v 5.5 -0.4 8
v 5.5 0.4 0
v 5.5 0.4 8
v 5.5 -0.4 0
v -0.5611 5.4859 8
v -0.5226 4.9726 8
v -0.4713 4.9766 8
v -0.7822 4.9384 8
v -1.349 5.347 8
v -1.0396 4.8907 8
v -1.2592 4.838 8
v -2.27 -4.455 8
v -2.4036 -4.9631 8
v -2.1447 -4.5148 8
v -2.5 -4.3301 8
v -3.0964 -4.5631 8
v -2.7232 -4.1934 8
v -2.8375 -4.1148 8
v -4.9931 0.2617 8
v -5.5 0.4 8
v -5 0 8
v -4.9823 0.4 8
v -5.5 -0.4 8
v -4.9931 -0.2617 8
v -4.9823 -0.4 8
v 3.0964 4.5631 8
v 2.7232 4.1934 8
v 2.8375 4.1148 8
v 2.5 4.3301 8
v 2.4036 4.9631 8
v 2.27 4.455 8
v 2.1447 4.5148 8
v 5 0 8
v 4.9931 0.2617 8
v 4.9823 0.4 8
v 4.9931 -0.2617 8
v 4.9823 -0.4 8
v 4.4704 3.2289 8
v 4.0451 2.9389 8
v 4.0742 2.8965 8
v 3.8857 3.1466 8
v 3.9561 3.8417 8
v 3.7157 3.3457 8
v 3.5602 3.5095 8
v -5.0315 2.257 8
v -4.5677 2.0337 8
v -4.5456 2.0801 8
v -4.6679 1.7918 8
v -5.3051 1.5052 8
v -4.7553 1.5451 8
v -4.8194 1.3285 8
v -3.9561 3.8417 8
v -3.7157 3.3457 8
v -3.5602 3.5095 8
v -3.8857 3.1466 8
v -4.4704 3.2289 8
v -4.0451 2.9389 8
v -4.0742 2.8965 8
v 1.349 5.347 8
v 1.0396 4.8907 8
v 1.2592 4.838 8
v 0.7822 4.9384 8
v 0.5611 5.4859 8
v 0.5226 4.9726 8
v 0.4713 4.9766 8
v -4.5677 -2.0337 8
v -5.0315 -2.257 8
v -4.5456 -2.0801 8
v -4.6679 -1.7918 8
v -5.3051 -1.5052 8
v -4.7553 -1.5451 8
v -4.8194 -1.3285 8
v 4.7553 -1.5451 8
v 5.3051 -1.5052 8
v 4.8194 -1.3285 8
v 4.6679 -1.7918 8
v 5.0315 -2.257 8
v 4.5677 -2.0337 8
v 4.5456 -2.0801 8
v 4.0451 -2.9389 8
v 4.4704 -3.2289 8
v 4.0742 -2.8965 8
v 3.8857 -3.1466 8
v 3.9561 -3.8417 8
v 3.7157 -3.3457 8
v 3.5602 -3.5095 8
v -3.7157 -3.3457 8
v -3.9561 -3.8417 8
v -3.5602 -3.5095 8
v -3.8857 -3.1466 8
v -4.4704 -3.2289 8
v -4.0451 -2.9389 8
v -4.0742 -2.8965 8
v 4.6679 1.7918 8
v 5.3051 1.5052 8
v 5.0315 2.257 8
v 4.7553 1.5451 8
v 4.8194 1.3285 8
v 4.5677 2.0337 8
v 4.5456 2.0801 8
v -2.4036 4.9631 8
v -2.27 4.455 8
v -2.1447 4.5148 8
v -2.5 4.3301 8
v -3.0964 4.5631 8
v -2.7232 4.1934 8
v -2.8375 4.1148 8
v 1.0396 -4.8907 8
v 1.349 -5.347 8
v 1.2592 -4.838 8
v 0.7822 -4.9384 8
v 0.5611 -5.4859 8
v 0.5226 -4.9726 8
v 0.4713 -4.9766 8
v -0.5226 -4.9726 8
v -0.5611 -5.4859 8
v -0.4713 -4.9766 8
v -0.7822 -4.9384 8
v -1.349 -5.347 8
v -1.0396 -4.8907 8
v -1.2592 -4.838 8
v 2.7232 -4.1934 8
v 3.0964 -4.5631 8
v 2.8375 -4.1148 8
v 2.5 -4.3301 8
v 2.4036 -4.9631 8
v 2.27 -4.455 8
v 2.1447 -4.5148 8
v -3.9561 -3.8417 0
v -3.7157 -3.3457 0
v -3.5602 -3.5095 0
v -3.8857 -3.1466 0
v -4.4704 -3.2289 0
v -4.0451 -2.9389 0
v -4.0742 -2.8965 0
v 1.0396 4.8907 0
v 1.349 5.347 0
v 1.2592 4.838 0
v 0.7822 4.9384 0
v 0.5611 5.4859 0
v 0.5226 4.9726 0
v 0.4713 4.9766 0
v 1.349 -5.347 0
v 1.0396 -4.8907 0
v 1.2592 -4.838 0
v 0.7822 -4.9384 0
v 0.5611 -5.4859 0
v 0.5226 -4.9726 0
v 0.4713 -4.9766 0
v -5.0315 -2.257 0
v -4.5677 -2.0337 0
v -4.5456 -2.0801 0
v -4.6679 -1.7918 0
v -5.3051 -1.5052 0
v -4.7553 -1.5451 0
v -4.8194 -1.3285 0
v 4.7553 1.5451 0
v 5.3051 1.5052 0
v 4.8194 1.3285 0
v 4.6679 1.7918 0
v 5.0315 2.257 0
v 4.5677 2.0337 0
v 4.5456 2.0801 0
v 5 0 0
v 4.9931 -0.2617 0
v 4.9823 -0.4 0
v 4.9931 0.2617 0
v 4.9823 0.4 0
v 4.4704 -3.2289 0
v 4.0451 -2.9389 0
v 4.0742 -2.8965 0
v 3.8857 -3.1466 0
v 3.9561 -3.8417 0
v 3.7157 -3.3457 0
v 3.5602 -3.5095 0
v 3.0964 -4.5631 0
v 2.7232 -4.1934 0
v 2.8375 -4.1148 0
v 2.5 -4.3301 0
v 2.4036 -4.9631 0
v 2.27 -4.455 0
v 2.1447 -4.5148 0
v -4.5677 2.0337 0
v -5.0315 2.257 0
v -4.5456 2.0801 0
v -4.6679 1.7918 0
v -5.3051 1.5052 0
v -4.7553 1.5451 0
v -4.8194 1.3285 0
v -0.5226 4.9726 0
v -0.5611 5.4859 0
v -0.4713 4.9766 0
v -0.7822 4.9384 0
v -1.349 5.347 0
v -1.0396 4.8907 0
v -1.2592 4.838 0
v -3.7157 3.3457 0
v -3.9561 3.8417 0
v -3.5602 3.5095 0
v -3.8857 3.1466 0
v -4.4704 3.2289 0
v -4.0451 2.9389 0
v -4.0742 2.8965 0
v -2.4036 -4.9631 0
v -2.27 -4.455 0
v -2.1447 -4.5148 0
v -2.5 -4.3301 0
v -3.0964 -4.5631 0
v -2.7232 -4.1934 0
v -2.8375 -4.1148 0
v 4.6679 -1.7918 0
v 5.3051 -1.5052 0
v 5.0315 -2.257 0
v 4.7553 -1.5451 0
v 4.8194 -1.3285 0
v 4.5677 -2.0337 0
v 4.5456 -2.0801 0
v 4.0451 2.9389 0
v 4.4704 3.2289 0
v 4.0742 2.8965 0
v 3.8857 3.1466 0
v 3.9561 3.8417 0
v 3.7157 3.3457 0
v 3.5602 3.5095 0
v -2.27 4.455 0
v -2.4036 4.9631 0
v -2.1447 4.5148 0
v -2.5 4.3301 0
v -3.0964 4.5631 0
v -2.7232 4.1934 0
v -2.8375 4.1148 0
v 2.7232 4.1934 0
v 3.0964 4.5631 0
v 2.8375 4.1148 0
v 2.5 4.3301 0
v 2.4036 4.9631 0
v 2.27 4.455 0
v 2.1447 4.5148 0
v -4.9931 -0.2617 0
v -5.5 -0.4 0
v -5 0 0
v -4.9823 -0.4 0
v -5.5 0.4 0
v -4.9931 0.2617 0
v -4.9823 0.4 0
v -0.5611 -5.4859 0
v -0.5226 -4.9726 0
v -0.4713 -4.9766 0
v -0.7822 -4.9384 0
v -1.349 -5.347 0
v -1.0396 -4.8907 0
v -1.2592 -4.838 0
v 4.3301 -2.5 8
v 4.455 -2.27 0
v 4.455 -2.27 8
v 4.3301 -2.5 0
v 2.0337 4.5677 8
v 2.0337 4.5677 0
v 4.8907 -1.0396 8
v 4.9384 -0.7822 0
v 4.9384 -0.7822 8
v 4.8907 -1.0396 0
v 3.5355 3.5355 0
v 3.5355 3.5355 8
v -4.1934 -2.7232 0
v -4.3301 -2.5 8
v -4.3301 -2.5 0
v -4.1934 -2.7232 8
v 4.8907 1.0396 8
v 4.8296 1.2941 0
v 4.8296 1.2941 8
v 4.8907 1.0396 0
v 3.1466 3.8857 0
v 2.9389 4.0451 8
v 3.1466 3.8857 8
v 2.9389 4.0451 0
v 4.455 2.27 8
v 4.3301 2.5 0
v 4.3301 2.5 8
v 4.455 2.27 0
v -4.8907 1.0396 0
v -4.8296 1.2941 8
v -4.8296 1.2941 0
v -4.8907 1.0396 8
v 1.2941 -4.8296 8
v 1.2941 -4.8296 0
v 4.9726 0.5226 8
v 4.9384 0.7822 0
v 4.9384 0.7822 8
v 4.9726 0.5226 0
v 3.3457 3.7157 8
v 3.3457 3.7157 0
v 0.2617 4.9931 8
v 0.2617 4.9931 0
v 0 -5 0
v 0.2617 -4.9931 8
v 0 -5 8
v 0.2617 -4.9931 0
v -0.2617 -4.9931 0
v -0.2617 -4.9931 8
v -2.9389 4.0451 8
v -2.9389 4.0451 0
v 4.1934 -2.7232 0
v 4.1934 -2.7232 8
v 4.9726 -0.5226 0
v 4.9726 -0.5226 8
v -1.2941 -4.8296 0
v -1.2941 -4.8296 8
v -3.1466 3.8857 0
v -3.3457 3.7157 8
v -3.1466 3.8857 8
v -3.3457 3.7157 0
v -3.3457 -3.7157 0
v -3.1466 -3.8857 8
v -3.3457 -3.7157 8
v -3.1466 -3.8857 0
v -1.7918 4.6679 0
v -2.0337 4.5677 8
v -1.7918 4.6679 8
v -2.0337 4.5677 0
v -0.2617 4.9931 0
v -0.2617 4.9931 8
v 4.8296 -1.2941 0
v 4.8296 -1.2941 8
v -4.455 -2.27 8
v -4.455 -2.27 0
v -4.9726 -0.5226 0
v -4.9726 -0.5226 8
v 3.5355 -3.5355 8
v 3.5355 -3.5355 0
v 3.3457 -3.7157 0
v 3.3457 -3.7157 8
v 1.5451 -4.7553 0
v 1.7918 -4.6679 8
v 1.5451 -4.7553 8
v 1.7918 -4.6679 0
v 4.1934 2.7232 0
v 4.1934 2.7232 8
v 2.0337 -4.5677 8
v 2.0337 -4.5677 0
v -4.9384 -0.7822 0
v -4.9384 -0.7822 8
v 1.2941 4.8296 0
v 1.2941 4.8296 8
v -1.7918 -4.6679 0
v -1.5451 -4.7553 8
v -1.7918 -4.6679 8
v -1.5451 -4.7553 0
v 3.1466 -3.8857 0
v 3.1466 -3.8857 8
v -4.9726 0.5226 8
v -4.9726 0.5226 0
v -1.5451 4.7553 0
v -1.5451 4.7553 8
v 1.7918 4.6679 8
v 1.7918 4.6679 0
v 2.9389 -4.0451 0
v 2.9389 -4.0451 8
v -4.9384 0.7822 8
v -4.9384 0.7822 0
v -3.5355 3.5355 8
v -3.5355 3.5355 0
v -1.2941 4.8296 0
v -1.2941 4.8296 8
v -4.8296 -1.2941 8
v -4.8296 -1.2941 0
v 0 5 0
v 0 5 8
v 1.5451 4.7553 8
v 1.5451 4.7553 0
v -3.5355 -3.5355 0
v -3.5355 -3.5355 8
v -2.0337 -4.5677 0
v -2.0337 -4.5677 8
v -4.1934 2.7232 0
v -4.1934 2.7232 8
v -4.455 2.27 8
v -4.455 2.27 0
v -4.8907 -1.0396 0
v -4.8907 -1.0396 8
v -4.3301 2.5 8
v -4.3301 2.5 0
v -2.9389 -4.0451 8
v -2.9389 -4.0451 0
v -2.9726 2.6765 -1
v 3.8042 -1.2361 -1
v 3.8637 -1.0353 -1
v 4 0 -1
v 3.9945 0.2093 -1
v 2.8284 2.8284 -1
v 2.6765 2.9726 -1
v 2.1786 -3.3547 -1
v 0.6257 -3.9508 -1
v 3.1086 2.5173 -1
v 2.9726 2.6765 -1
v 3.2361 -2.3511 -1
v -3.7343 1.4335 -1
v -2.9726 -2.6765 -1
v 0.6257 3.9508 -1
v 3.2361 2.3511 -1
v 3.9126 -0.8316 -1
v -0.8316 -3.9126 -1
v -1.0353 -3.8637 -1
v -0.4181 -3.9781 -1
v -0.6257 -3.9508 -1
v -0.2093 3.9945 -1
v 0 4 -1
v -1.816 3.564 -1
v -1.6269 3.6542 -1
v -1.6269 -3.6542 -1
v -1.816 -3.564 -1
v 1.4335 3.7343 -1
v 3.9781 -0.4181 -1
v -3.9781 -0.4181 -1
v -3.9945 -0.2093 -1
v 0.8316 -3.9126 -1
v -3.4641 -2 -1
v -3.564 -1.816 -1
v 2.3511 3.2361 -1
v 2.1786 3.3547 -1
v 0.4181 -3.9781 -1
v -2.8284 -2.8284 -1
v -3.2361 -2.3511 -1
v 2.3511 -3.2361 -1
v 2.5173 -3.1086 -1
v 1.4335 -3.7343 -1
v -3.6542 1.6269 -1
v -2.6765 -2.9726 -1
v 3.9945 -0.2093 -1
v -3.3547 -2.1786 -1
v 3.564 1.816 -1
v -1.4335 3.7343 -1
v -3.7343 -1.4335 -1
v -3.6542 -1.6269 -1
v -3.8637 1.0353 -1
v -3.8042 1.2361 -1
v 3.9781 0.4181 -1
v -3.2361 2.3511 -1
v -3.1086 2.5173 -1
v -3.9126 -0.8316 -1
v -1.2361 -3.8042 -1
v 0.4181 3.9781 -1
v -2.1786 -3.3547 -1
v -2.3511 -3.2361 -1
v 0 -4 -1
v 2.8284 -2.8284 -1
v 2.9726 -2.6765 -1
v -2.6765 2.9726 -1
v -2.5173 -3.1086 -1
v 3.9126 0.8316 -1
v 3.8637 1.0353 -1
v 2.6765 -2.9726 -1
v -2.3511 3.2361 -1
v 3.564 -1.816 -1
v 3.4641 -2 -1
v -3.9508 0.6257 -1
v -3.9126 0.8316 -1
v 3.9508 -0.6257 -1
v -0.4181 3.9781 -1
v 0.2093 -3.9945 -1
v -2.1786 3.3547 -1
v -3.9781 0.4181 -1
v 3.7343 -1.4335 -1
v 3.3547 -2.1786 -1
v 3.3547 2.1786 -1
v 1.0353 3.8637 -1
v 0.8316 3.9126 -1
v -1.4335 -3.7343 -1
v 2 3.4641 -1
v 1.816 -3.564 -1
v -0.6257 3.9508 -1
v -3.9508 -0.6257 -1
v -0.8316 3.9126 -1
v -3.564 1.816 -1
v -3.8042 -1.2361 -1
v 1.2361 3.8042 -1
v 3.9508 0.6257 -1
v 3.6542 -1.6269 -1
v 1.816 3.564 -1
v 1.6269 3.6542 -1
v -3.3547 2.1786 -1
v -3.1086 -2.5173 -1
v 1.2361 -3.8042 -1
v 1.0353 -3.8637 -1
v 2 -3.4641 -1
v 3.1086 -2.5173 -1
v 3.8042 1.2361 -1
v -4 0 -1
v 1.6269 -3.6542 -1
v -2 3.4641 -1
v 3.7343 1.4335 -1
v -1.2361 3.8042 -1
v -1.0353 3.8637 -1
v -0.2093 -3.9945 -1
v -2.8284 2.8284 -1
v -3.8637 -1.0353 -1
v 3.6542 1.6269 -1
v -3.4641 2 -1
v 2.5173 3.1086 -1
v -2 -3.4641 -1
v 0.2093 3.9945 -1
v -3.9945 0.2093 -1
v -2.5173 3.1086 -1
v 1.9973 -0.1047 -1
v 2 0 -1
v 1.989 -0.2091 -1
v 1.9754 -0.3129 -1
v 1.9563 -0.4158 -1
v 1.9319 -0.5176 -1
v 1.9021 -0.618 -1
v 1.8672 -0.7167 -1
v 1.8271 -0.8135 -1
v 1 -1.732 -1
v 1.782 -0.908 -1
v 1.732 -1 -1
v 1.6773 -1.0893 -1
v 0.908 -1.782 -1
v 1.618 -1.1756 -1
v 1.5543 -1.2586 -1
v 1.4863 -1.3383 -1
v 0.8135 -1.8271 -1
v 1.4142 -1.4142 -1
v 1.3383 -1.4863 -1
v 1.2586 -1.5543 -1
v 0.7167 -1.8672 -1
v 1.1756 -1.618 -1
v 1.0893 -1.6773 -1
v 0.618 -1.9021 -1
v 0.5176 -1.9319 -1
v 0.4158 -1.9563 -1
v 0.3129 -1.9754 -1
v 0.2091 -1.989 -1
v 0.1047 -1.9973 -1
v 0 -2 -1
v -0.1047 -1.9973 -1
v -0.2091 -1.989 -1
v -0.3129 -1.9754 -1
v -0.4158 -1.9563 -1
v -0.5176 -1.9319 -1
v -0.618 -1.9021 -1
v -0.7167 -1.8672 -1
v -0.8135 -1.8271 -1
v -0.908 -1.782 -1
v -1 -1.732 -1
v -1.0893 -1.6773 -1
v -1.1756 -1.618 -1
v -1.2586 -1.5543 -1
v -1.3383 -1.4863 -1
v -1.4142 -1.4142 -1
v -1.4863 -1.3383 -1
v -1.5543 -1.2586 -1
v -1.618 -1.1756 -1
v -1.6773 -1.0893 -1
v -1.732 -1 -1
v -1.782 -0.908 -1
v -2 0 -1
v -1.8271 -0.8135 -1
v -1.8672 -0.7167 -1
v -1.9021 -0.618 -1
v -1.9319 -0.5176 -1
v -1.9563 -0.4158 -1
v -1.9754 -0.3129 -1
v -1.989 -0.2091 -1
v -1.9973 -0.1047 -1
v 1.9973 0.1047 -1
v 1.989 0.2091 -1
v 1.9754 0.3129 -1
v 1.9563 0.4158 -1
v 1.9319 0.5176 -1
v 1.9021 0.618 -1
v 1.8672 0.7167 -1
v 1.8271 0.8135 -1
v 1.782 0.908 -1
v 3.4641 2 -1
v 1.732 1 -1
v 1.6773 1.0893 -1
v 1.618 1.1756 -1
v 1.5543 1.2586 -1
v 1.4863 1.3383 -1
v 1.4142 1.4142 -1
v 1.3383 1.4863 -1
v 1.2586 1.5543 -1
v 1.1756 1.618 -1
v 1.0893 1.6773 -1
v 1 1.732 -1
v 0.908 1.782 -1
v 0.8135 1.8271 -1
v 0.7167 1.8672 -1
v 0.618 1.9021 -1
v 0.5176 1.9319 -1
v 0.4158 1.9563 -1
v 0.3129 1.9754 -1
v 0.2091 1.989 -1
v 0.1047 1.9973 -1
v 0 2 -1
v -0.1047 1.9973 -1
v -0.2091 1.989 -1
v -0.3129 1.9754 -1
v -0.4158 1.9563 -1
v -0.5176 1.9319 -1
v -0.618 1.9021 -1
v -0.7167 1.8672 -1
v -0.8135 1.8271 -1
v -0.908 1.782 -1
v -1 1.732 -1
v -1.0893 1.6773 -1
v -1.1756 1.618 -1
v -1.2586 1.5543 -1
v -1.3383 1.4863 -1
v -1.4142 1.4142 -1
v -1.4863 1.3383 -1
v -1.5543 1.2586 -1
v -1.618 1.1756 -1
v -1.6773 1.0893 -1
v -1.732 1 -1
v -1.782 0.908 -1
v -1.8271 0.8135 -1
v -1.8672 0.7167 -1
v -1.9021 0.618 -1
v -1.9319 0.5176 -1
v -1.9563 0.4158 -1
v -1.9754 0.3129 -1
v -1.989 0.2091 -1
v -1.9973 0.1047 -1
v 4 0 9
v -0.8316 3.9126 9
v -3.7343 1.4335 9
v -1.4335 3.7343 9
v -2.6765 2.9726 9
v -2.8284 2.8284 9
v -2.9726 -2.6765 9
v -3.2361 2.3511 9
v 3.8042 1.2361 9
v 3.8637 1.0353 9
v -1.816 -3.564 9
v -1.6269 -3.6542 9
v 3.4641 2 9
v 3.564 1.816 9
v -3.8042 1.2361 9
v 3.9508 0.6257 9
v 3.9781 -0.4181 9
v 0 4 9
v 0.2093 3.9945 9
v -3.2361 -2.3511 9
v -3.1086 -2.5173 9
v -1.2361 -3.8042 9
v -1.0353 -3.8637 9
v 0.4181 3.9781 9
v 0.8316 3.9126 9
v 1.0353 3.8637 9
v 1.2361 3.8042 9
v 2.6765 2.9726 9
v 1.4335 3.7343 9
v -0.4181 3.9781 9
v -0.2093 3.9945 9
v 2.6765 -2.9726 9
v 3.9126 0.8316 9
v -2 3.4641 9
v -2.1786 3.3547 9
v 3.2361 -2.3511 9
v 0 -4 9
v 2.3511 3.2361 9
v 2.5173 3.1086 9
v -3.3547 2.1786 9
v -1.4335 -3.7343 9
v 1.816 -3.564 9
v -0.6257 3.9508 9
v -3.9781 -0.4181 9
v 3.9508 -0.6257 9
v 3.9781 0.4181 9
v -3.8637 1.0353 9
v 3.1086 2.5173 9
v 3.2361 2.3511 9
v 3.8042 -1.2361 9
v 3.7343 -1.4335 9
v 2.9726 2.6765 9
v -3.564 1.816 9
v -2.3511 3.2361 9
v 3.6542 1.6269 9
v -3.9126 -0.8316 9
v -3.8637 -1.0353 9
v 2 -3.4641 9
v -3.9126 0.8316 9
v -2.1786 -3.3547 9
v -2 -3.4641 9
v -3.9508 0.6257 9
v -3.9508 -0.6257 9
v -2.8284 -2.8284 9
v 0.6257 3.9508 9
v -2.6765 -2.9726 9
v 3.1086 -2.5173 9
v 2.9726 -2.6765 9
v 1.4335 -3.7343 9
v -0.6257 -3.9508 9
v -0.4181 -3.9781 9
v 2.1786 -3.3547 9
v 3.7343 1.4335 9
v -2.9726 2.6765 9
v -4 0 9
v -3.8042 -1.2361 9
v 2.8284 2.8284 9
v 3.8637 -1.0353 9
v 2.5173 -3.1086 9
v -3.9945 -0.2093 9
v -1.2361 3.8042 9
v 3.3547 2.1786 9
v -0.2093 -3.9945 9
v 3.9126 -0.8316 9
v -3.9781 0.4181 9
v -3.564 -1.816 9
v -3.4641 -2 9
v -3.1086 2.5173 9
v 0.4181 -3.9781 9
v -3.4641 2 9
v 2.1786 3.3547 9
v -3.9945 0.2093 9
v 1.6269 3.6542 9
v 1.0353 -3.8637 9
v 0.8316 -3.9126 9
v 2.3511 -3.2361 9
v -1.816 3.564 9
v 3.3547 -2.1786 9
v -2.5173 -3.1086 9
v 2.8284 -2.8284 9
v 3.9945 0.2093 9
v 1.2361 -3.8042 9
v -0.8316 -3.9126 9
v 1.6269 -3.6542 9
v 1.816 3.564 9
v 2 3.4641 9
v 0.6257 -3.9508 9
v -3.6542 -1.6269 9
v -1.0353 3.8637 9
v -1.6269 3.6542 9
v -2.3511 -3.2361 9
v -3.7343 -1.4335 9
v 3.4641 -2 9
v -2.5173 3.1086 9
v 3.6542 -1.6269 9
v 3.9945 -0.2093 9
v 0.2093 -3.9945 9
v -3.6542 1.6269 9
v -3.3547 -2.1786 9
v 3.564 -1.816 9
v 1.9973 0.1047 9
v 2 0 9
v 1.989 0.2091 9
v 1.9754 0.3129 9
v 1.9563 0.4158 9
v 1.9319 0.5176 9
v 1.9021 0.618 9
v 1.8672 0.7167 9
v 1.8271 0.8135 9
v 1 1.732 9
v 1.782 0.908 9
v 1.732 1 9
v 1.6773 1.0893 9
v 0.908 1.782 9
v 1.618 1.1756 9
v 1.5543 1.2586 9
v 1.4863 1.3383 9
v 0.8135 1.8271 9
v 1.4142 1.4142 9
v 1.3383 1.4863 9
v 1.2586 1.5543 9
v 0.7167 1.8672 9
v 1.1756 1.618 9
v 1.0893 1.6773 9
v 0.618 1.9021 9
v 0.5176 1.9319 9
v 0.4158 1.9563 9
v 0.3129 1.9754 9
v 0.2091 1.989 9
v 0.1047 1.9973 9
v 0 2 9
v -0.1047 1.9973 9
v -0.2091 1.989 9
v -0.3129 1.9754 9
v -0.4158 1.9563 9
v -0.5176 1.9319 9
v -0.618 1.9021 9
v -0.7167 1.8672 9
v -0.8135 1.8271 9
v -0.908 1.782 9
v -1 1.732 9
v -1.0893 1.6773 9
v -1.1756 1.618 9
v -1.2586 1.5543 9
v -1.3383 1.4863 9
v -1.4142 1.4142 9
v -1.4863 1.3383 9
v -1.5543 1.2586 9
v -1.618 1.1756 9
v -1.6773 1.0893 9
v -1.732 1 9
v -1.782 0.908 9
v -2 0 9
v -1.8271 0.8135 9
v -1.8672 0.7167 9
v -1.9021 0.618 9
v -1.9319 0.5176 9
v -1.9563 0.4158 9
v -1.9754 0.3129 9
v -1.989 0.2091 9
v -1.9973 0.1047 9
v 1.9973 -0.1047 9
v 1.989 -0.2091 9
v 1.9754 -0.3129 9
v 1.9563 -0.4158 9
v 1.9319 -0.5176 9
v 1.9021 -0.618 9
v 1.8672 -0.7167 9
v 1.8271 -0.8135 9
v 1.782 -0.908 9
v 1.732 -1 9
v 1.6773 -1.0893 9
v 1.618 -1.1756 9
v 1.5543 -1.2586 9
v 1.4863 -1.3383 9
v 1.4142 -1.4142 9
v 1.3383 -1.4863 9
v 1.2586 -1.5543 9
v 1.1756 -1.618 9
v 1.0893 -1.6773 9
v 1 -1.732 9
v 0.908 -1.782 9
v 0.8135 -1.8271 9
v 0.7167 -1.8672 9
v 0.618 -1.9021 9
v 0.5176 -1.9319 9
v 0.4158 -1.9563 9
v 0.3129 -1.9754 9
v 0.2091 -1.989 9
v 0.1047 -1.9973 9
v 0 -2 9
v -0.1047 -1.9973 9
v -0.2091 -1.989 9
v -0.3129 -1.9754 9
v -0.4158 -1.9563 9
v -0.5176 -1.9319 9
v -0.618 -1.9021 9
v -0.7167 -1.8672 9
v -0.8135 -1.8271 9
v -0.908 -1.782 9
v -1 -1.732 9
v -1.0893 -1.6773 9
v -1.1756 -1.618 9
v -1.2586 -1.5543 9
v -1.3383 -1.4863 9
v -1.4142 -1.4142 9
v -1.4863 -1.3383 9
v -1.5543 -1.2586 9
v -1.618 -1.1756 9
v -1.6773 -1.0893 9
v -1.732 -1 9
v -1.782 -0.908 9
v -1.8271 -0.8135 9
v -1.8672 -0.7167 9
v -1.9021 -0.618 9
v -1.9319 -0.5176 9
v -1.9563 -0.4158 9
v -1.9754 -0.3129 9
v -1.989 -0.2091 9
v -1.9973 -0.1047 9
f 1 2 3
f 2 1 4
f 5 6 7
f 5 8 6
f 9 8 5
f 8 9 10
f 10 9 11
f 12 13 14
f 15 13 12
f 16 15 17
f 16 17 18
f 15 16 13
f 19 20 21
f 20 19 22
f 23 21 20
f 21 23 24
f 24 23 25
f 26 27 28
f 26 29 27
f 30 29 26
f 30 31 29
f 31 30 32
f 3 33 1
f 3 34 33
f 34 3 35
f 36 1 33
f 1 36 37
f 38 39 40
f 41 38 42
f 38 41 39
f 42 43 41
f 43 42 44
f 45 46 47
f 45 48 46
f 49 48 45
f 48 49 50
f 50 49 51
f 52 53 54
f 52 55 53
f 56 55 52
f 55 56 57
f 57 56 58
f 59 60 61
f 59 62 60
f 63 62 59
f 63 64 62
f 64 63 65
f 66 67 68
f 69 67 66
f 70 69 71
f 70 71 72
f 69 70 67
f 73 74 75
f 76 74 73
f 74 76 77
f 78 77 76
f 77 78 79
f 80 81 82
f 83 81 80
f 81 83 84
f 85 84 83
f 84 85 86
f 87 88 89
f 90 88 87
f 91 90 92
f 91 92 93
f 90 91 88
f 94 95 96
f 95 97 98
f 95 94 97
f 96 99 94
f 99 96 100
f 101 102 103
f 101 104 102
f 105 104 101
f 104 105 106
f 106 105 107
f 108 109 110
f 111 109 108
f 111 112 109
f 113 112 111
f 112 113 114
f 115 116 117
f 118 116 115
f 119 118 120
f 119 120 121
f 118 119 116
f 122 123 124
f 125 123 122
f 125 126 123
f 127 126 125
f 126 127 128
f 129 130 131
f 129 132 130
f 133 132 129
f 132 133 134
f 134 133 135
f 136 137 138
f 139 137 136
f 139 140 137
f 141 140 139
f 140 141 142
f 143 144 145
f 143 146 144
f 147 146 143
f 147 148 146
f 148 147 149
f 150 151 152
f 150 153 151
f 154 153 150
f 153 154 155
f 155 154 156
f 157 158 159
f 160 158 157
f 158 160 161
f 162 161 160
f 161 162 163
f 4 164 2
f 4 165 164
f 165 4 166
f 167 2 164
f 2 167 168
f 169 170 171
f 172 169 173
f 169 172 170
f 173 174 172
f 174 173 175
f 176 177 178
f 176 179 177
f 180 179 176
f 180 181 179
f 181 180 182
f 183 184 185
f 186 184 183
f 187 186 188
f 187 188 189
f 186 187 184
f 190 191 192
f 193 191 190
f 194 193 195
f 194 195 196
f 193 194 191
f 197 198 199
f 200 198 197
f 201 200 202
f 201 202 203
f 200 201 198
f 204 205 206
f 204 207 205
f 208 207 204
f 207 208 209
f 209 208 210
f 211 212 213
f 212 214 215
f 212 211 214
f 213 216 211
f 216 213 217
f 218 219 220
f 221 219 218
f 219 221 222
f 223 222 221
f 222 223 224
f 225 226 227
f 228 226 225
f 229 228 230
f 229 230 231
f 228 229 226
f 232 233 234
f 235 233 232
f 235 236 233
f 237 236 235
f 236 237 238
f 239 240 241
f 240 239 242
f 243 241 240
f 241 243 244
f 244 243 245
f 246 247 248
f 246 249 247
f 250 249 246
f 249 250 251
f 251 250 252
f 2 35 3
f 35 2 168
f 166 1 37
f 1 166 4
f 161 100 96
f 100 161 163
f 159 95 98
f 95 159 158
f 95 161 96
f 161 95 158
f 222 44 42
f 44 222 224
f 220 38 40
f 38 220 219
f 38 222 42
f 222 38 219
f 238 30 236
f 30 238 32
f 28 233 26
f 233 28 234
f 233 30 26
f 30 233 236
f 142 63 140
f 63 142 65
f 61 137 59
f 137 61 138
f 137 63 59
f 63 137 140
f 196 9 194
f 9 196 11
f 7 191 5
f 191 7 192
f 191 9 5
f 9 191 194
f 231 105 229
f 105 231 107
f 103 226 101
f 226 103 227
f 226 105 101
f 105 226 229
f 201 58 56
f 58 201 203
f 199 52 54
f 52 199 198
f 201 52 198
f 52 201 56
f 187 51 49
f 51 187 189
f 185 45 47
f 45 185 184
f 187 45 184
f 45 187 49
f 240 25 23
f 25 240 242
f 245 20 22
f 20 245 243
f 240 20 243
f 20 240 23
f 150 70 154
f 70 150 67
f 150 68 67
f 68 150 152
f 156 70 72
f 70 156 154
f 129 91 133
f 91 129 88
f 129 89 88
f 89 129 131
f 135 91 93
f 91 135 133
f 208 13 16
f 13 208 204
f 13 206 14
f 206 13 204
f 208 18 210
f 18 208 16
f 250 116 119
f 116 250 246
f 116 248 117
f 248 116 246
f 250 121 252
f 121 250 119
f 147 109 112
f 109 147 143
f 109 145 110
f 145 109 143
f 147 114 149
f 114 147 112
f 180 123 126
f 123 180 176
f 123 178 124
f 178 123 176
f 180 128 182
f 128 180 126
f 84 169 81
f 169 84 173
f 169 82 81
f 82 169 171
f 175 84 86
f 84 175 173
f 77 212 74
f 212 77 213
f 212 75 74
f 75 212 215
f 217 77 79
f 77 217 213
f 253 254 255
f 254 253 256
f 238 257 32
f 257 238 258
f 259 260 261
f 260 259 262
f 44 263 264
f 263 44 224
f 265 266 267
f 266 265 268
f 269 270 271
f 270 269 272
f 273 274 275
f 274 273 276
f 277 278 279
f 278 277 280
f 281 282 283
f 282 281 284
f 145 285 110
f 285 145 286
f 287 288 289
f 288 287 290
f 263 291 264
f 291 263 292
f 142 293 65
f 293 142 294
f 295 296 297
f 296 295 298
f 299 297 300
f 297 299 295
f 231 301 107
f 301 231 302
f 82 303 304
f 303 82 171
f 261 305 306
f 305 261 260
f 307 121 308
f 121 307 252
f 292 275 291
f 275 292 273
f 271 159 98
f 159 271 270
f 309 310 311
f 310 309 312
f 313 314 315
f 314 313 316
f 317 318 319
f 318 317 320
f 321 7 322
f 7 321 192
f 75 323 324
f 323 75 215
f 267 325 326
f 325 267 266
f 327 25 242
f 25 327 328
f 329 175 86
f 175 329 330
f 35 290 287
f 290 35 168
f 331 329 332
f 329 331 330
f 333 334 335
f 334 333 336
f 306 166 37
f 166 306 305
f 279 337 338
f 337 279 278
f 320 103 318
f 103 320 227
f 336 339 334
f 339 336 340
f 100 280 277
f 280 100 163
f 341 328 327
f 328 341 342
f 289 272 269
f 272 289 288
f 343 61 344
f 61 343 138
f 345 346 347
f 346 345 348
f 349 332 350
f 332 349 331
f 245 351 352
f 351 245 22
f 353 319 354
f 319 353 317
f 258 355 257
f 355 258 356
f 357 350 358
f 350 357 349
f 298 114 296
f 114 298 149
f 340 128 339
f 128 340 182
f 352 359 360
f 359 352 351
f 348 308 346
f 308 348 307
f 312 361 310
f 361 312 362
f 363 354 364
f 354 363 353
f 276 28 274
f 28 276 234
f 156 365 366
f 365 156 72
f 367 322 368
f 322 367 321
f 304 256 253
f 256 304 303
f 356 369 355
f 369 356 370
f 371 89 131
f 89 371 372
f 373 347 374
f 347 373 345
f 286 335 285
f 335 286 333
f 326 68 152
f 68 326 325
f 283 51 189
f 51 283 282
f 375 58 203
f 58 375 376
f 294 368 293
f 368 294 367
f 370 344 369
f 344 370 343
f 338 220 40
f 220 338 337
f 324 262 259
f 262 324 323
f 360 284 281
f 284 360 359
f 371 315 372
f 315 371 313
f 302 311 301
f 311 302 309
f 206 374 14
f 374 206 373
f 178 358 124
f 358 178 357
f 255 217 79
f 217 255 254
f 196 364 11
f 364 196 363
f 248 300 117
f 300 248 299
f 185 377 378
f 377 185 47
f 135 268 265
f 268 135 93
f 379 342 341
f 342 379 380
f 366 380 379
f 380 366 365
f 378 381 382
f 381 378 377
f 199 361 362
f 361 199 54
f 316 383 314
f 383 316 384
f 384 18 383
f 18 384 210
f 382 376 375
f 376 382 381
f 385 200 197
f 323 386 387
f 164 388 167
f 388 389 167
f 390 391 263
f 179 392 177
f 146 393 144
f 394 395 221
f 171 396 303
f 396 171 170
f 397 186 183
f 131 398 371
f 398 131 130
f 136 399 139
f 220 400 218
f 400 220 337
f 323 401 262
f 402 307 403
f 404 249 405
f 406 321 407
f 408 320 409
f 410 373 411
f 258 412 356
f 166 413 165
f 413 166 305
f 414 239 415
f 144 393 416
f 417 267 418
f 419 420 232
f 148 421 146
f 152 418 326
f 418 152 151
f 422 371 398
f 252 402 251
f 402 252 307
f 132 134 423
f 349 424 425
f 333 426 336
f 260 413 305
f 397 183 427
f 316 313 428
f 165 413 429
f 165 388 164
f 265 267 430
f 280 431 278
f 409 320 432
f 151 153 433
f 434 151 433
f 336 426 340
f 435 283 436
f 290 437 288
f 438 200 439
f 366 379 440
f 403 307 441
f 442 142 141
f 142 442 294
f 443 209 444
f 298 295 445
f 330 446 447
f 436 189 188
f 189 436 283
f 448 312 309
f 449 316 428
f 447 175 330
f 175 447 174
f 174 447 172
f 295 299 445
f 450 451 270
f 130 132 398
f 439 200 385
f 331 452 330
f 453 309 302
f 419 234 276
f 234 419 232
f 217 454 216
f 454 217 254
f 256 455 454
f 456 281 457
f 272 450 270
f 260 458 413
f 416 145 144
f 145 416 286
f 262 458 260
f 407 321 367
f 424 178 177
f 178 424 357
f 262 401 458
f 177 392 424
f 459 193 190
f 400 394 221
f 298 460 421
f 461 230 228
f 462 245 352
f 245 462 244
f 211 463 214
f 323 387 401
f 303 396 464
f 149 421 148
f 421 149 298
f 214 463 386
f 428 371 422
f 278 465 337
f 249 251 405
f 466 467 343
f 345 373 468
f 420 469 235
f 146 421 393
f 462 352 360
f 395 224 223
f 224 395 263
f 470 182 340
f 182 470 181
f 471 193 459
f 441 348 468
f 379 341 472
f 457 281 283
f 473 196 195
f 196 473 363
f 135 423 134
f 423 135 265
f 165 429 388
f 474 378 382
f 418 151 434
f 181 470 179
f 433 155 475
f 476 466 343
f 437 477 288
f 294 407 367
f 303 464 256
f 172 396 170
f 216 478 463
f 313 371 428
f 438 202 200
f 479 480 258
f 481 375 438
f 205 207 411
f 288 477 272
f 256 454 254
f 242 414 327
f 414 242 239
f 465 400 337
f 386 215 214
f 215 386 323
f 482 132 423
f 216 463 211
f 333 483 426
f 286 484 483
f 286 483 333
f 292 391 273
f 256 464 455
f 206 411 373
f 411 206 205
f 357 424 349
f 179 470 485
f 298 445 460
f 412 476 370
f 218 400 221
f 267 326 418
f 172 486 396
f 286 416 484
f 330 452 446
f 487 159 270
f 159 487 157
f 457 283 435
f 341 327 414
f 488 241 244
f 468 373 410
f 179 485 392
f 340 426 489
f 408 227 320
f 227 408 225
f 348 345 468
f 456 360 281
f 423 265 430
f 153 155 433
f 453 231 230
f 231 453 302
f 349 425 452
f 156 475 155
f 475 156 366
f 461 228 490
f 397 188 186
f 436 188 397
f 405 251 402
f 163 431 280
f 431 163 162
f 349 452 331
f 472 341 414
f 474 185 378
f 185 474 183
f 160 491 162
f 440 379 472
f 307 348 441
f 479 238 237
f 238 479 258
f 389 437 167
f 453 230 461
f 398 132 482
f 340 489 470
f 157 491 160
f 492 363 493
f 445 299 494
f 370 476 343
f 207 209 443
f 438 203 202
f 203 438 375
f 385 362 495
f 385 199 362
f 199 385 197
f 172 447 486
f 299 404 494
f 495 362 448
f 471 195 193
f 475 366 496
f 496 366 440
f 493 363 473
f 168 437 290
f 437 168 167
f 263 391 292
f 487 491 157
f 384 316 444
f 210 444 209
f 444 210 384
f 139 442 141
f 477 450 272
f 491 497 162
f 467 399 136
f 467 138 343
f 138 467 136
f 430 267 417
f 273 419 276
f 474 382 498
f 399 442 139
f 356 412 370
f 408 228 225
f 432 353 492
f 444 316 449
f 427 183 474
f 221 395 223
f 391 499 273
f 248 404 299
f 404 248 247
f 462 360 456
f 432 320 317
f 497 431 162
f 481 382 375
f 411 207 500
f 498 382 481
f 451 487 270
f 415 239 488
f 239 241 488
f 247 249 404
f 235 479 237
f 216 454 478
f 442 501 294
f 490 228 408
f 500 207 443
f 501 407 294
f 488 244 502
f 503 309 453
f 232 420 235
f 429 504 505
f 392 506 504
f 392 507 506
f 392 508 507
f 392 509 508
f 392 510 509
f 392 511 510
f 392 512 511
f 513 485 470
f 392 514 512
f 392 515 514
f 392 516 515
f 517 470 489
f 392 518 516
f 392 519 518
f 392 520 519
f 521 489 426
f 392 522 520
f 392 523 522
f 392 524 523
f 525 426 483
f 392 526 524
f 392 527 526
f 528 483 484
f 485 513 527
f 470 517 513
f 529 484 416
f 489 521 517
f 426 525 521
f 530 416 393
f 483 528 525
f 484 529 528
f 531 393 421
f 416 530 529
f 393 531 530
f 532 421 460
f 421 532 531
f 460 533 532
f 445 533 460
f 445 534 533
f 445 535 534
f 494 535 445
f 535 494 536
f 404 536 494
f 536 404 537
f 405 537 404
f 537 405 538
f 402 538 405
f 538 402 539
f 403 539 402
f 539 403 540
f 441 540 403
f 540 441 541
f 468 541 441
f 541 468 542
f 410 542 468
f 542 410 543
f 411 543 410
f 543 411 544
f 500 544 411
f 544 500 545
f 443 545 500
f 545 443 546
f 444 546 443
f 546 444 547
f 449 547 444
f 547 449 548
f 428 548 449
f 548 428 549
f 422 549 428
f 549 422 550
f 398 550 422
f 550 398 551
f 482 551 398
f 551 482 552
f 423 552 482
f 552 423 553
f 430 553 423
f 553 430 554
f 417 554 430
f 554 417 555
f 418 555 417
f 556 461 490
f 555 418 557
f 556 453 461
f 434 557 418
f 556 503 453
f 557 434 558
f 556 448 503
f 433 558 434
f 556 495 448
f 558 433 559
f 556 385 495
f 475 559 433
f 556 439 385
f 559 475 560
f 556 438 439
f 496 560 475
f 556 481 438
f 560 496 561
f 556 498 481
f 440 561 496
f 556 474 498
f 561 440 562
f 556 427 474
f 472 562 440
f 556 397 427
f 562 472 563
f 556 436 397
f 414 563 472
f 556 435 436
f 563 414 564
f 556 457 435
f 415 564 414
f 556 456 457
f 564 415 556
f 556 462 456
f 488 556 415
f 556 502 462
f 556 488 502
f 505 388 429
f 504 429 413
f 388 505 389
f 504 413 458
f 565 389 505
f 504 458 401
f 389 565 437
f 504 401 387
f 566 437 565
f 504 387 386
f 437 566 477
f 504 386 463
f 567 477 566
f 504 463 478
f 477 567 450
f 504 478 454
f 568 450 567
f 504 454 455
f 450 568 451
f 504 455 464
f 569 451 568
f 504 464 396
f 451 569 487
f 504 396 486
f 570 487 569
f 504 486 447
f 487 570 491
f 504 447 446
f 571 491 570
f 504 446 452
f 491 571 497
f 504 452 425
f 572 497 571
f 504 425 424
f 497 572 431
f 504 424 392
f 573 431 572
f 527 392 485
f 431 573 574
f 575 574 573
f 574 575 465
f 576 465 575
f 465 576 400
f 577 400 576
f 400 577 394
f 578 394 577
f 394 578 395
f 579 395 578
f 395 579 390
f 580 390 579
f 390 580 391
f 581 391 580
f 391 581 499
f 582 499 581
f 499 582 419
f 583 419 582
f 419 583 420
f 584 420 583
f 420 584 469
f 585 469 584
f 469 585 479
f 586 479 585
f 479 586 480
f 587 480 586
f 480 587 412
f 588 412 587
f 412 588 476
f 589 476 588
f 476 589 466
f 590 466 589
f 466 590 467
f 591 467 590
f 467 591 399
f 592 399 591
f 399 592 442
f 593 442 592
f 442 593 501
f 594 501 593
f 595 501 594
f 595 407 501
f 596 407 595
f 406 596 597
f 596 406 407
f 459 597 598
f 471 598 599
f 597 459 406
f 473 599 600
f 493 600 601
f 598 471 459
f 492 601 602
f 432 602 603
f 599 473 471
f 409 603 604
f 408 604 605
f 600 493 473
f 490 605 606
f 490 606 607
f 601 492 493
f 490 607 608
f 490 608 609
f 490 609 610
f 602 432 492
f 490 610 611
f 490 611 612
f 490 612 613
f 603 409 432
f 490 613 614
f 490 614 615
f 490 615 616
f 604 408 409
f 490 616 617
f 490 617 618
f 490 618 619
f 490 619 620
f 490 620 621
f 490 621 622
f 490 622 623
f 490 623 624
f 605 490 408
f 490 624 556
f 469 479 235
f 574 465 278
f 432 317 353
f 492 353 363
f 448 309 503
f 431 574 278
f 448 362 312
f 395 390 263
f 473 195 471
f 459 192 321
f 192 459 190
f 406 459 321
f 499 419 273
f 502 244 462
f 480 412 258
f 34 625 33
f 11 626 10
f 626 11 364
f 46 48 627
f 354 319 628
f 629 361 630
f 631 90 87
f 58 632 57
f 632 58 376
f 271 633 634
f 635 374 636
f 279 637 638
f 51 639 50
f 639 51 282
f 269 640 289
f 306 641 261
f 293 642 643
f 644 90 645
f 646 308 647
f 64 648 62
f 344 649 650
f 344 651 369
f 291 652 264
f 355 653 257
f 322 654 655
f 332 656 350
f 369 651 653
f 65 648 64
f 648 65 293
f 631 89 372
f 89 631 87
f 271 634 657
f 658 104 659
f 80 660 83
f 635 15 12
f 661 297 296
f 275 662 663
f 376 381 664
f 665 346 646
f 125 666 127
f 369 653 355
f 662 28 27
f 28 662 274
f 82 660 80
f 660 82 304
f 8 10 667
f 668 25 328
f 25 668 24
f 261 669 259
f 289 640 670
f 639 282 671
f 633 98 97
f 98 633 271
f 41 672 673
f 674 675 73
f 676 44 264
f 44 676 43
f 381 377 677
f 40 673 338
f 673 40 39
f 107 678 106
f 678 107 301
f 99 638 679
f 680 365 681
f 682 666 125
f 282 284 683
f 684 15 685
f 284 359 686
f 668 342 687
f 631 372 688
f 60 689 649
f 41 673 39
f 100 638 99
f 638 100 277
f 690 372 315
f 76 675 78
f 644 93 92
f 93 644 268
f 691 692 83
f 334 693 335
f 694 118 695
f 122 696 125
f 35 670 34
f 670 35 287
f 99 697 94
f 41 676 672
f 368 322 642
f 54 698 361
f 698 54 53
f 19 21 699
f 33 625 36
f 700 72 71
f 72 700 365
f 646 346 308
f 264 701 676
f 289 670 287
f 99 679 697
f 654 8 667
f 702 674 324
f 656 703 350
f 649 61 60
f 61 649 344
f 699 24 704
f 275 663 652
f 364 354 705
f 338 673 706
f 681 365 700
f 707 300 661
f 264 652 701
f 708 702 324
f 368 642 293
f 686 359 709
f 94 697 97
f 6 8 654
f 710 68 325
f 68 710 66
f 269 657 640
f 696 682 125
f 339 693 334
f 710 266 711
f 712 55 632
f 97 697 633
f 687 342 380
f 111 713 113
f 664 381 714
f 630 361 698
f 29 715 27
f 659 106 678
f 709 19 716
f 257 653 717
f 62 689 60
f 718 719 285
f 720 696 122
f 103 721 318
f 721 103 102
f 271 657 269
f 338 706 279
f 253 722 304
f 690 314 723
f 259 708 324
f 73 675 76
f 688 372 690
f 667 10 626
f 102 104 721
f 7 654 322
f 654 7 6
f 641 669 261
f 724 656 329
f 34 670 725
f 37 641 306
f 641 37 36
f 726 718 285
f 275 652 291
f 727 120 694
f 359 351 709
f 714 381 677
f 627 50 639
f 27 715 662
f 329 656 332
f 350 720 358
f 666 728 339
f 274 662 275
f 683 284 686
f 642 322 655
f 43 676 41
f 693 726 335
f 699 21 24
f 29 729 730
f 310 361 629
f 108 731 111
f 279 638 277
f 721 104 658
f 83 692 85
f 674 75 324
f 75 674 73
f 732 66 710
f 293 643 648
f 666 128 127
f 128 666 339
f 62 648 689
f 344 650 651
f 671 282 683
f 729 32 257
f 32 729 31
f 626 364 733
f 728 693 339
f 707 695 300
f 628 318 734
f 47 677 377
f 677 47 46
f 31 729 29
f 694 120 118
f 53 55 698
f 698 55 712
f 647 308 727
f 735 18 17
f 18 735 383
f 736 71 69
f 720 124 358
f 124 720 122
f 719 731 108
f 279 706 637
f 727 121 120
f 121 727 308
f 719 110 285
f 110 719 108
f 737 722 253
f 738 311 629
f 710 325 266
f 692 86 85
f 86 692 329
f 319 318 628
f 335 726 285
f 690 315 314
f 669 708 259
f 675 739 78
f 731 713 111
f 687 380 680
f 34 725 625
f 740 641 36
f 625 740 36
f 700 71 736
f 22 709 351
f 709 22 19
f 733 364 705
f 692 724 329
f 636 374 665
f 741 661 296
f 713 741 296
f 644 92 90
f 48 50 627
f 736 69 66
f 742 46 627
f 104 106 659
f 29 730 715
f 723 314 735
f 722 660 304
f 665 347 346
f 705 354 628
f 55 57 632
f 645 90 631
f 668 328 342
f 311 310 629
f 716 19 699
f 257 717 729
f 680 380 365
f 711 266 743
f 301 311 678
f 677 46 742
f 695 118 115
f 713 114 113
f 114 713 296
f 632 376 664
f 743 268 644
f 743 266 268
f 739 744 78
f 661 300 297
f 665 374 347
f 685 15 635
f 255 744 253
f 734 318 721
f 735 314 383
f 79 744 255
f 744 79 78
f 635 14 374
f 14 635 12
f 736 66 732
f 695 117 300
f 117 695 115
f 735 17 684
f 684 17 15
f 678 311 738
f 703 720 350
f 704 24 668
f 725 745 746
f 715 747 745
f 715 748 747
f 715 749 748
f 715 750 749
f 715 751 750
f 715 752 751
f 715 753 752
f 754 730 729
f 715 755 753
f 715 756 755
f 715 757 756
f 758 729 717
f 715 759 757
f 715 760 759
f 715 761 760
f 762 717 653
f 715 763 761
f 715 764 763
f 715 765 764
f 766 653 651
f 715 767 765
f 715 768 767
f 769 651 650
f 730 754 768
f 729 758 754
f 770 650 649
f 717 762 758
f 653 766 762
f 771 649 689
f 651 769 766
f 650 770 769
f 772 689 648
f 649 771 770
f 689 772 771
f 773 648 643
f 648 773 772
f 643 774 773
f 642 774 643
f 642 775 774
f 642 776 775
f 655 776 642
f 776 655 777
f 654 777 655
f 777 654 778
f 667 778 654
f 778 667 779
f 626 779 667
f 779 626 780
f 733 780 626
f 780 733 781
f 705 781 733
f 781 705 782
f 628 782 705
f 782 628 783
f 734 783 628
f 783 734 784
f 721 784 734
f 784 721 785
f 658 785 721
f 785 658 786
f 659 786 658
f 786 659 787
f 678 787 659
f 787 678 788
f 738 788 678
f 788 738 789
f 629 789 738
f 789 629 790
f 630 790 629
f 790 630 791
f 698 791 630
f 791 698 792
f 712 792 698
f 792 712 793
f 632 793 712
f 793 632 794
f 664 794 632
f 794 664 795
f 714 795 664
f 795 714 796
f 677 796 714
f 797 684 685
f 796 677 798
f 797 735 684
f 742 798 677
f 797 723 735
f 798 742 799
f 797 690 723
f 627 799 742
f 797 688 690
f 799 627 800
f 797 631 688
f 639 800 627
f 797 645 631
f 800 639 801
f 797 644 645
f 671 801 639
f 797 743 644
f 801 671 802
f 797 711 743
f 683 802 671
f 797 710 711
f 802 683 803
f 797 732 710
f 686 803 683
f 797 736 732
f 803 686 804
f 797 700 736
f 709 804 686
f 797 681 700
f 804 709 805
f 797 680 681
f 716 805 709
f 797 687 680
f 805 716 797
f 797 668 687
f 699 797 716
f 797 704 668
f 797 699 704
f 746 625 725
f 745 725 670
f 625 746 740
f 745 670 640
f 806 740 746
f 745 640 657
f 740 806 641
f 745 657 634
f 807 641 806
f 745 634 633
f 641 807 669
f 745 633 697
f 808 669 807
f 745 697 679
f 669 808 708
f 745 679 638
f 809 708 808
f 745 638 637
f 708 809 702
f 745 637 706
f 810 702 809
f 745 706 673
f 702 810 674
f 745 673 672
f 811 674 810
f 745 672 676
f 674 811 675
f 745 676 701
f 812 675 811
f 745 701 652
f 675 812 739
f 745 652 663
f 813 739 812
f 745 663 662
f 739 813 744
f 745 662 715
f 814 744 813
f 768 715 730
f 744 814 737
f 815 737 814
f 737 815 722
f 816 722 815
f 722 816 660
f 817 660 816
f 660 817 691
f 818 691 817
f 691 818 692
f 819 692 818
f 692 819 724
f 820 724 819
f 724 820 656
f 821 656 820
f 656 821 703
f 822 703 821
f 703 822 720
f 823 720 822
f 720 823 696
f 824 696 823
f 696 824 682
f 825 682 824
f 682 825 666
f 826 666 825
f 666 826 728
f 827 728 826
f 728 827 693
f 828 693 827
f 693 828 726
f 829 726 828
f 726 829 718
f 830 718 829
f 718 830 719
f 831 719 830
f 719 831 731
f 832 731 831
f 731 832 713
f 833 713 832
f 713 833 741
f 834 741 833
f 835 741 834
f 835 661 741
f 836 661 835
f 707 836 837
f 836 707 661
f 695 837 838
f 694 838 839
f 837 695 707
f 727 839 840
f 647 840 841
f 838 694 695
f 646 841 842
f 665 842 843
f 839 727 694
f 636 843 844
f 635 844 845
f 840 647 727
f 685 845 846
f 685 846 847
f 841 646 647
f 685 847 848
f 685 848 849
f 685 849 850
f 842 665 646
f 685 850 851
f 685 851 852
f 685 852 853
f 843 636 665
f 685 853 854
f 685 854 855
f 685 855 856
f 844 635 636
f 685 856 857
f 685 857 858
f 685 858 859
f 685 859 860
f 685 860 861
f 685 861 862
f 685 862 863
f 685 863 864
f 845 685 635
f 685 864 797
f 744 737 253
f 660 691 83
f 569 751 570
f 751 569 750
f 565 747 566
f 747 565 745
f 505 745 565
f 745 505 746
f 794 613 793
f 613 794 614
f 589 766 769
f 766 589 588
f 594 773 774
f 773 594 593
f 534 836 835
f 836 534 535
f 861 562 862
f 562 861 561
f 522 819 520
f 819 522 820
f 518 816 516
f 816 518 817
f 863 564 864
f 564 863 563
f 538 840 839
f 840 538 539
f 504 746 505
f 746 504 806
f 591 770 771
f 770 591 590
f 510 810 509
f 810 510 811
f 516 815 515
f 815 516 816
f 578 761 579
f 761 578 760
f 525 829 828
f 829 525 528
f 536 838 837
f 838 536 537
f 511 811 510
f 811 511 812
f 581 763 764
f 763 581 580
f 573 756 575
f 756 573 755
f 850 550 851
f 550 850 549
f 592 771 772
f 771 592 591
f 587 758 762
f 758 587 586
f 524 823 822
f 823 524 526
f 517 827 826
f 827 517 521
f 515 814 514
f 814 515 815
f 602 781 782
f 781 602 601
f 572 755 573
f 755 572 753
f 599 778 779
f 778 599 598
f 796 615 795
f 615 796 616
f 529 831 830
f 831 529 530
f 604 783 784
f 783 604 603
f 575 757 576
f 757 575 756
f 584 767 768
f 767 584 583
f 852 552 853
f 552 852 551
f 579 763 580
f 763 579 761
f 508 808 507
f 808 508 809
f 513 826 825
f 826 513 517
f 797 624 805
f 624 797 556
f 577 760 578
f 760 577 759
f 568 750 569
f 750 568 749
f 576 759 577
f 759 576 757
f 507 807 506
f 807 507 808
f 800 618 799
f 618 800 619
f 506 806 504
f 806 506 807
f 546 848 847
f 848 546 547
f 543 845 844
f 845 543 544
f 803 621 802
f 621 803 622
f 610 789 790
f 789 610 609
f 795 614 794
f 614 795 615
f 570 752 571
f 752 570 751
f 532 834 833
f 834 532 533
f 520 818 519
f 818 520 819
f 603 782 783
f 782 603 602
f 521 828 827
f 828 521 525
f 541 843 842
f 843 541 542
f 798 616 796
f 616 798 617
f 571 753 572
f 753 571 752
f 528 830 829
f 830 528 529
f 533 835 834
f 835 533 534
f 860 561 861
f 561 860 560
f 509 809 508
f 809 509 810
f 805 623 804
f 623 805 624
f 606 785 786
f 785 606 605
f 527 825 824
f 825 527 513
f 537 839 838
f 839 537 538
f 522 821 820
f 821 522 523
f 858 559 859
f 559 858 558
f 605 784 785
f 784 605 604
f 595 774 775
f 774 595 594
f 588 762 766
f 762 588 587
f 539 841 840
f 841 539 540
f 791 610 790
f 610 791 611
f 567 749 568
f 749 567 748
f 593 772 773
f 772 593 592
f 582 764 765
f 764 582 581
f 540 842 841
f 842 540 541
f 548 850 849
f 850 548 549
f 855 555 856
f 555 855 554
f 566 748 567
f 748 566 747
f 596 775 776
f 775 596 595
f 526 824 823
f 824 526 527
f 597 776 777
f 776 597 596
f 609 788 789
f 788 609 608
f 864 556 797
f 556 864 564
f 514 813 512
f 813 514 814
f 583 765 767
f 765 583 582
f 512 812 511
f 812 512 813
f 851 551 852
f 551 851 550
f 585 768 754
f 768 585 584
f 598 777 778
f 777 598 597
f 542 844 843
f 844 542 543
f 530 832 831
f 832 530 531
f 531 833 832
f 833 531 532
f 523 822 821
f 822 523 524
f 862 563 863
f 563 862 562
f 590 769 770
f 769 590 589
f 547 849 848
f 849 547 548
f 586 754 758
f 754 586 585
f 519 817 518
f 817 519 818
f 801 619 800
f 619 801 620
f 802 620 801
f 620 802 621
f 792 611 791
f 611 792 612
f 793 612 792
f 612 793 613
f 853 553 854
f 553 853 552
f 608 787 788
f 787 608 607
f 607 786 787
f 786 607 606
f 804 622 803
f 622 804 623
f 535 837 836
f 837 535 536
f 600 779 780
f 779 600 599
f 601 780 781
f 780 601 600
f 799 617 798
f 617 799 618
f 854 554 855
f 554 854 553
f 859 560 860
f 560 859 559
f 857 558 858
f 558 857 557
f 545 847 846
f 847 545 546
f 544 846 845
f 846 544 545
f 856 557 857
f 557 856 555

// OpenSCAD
$fn = 120;

// Threaded heat-set insert (mm)
outer_diameter = 10.0;
length         = 8.0;

// For 4.0mm screws (user requested)
inner_diameter = 4.0;

// Knurl / ribs
knurl_depth   = 0.5;   // radial protrusion beyond OD
knurl_count   = 18;    // number of ribs around circumference
knurl_width   = 0.8;   // tangential width of each rib
knurl_overlap = 0.20;  // how much each rib sinks into the body for guaranteed connectivity

// End chamfers
lead_in_chamfer          = 1.0;  // bottom
installation_end_chamfer = 1.0;  // top

eps = 0.02;

module threaded_insert() {
    difference() {
        heat_set_insert_body();
        internal_bore();
    }
}

module heat_set_insert_body() {
    union() {
        // Main body
        cylinder(d=outer_diameter, h=length, center=false);

        // Bottom chamfer (lead-in) - attached to z=0 face
        translate([0, 0, -lead_in_chamfer])
            cylinder(
                d1=max(outer_diameter - 2*lead_in_chamfer, 0.01),
                d2=outer_diameter,
                h=lead_in_chamfer,
                center=false
            );

        // Top chamfer (installation end) - attached to z=length face
        translate([0, 0, length])
            cylinder(
                d1=outer_diameter,
                d2=max(outer_diameter - 2*installation_end_chamfer, 0.01),
                h=installation_end_chamfer,
                center=false
            );

        // External ribs (knurl)
        outer_ribs();
    }
}

module internal_bore() {
    // Through-hole across full insert including chamfers
    translate([0, 0, -lead_in_chamfer - eps])
        cylinder(
            d=inner_diameter,
            h=length + lead_in_chamfer + installation_end_chamfer + 2*eps,
            center=false
        );
}

module outer_ribs() {
    rib_h = length;

    // Place ribs so their inner face overlaps into the main cylinder by knurl_overlap
    // Rib radial thickness = knurl_depth + knurl_overlap
    rib_radial_thickness = knurl_depth + knurl_overlap;

    // Center radius so inner face is at (outer_diameter/2 - knurl_overlap)
    rib_r_center = outer_diameter/2 + rib_radial_thickness/2 - knurl_overlap;

    for (i = [0 : knurl_count-1]) {
        rotate([0, 0, i * 360/knurl_count])
            translate([rib_r_center, 0, rib_h/2])
                cube([rib_radial_thickness, knurl_width, rib_h], center=true);
    }
}

threaded_insert();
